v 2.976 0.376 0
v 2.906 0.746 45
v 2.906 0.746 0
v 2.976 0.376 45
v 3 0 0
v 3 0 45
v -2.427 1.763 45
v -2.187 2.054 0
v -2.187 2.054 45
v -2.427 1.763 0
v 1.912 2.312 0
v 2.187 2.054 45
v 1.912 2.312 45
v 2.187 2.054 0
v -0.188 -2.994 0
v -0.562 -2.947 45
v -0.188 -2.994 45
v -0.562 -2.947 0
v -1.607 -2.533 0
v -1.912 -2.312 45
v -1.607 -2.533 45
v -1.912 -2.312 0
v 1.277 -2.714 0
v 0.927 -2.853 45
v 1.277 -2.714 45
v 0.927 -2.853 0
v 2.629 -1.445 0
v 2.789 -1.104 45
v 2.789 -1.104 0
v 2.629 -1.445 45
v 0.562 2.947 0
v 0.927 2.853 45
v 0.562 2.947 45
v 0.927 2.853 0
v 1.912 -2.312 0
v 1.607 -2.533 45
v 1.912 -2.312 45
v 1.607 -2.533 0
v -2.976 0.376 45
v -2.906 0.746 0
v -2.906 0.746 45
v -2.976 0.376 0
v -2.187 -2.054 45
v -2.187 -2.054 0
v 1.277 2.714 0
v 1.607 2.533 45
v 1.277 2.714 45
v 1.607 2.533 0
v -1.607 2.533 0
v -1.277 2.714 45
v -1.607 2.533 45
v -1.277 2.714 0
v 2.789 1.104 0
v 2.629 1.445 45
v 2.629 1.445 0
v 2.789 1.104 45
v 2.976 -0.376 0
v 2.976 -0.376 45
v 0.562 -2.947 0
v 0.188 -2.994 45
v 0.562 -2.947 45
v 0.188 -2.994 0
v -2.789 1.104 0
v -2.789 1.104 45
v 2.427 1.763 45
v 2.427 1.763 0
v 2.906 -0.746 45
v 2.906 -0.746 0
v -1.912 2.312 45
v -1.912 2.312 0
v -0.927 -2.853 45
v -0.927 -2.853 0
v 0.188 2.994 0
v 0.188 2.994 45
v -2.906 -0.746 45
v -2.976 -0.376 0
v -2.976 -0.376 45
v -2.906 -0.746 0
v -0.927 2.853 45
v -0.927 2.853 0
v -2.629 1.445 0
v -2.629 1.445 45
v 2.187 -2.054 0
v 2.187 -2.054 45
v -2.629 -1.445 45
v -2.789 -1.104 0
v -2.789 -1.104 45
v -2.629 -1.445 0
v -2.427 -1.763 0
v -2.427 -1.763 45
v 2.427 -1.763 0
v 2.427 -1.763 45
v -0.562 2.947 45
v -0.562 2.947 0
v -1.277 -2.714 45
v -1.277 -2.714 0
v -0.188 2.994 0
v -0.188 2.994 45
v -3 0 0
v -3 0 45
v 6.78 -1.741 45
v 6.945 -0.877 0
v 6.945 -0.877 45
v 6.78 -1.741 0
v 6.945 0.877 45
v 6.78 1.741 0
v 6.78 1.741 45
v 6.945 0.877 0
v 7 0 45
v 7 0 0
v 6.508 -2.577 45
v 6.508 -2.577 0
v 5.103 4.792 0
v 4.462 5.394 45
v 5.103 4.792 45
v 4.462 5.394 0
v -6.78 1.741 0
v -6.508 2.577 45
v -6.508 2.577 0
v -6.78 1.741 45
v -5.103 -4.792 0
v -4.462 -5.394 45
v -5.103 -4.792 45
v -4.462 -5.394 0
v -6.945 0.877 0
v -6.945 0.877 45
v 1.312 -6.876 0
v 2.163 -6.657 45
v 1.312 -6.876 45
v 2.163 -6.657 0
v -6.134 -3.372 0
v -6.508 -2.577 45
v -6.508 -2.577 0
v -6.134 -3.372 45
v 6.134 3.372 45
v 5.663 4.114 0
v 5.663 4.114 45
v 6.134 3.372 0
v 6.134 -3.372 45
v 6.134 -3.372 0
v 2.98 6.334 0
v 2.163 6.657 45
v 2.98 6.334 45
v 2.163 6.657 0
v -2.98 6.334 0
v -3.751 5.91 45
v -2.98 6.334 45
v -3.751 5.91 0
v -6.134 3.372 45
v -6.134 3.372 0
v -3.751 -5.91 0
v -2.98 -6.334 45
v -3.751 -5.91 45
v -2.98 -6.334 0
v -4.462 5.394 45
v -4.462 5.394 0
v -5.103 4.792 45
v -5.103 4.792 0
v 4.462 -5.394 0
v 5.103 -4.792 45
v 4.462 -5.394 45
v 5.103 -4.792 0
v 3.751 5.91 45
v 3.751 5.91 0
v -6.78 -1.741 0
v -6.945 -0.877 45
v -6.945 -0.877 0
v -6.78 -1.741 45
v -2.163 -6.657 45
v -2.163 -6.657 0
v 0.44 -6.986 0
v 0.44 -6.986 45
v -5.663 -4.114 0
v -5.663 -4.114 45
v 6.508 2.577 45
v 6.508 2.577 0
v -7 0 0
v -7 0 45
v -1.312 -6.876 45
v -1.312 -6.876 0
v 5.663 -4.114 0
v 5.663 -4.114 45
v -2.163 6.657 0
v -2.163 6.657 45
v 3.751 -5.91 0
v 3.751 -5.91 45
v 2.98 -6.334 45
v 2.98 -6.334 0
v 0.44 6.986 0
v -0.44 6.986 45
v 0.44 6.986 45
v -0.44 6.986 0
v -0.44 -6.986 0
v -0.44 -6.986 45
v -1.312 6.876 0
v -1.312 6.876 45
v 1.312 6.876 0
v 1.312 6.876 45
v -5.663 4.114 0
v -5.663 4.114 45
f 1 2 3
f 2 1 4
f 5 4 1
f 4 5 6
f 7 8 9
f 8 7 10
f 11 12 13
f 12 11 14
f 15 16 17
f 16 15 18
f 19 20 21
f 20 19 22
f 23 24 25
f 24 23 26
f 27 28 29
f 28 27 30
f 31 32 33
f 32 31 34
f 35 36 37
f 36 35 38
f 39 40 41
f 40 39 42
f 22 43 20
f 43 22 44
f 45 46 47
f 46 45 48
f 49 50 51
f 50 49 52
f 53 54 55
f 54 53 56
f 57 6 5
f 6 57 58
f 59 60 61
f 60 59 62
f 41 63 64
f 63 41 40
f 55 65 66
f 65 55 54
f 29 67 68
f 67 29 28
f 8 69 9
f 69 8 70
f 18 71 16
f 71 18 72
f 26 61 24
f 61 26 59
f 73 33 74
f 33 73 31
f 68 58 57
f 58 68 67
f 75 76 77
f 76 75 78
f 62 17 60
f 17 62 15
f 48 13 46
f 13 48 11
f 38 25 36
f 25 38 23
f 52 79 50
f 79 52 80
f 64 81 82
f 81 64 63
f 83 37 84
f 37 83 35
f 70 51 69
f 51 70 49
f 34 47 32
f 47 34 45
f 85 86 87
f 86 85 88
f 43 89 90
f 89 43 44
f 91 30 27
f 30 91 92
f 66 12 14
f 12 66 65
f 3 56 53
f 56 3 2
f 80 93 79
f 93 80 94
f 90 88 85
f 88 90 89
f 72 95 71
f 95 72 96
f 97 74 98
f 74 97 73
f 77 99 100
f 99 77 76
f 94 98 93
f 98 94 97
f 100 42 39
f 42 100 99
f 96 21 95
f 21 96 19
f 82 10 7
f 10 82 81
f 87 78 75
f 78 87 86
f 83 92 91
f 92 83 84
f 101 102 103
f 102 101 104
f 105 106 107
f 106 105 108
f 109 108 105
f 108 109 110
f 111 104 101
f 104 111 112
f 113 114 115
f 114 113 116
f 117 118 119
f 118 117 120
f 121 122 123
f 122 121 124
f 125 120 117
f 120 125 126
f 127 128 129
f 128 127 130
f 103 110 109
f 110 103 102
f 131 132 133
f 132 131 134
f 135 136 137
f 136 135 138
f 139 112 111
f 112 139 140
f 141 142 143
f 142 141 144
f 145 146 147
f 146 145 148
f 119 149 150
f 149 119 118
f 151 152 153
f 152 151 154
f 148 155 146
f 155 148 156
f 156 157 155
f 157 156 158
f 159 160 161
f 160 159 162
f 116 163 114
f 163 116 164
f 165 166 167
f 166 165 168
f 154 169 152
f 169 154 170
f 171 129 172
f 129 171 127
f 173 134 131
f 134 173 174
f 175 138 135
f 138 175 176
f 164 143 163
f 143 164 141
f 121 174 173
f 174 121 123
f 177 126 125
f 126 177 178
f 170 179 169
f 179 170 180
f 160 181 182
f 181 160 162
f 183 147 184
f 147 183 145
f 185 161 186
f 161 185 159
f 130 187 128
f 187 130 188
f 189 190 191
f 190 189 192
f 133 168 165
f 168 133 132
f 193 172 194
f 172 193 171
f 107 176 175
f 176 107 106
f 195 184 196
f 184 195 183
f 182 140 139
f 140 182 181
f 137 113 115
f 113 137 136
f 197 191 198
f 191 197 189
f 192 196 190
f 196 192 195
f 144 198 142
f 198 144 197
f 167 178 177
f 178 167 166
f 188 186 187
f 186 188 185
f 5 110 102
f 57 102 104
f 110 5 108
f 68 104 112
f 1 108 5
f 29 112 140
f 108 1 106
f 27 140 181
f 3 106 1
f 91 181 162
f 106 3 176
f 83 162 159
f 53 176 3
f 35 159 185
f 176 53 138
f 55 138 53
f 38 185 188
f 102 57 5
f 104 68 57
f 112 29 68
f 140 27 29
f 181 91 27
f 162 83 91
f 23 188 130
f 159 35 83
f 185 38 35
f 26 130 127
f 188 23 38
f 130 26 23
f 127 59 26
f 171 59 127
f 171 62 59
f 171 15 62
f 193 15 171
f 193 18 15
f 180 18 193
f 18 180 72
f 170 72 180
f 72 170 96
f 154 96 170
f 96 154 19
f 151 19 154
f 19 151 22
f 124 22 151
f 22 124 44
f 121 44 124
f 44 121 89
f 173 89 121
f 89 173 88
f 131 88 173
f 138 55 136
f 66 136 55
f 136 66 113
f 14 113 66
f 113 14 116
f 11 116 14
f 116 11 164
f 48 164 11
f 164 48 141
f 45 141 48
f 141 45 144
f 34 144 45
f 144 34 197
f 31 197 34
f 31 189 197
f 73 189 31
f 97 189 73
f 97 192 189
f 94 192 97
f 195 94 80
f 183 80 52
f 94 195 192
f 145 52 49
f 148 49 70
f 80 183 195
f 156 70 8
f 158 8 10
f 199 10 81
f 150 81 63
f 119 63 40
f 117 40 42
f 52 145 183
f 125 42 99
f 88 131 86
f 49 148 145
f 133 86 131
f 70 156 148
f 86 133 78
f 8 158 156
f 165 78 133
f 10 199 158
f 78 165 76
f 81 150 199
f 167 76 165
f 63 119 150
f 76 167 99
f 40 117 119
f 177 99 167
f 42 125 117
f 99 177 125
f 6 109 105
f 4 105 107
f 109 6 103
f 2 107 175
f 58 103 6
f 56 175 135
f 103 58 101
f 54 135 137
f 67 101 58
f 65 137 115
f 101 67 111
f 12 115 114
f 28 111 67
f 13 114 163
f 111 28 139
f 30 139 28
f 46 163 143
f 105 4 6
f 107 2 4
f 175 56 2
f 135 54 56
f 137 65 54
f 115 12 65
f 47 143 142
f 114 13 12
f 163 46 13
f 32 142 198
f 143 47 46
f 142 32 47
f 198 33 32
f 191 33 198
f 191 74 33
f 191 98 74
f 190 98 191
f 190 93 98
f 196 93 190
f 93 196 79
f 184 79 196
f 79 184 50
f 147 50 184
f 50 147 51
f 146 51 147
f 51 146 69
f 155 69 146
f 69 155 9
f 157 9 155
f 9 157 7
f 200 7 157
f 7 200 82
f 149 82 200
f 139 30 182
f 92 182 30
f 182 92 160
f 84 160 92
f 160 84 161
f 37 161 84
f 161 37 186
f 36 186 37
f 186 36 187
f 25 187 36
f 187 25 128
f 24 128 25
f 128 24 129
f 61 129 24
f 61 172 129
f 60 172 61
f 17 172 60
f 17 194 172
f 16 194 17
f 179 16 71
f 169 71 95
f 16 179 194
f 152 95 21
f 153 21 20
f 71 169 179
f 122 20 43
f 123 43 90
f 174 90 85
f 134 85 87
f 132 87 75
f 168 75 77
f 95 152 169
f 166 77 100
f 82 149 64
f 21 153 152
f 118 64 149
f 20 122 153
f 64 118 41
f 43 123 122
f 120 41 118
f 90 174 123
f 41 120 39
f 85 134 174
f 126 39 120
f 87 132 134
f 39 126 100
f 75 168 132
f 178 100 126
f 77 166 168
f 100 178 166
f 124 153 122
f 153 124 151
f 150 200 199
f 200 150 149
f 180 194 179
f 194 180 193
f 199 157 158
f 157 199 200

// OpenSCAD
$fn = 50;


difference() {
	union() {
		cylinder(h = 45, r = 7.0000000000);
	}
	union() {
		translate(v = [0.0000000000, 0.0000000000, -100.0000000000]) {
			cylinder(h = 200, r = 3.0000000000);
		}
		cylinder(h = 45, r = 1.5000000000);
		cylinder(h = 45, r = 1.5000000000);
		cylinder(h = 45, r = 1.5000000000);
	}
}
